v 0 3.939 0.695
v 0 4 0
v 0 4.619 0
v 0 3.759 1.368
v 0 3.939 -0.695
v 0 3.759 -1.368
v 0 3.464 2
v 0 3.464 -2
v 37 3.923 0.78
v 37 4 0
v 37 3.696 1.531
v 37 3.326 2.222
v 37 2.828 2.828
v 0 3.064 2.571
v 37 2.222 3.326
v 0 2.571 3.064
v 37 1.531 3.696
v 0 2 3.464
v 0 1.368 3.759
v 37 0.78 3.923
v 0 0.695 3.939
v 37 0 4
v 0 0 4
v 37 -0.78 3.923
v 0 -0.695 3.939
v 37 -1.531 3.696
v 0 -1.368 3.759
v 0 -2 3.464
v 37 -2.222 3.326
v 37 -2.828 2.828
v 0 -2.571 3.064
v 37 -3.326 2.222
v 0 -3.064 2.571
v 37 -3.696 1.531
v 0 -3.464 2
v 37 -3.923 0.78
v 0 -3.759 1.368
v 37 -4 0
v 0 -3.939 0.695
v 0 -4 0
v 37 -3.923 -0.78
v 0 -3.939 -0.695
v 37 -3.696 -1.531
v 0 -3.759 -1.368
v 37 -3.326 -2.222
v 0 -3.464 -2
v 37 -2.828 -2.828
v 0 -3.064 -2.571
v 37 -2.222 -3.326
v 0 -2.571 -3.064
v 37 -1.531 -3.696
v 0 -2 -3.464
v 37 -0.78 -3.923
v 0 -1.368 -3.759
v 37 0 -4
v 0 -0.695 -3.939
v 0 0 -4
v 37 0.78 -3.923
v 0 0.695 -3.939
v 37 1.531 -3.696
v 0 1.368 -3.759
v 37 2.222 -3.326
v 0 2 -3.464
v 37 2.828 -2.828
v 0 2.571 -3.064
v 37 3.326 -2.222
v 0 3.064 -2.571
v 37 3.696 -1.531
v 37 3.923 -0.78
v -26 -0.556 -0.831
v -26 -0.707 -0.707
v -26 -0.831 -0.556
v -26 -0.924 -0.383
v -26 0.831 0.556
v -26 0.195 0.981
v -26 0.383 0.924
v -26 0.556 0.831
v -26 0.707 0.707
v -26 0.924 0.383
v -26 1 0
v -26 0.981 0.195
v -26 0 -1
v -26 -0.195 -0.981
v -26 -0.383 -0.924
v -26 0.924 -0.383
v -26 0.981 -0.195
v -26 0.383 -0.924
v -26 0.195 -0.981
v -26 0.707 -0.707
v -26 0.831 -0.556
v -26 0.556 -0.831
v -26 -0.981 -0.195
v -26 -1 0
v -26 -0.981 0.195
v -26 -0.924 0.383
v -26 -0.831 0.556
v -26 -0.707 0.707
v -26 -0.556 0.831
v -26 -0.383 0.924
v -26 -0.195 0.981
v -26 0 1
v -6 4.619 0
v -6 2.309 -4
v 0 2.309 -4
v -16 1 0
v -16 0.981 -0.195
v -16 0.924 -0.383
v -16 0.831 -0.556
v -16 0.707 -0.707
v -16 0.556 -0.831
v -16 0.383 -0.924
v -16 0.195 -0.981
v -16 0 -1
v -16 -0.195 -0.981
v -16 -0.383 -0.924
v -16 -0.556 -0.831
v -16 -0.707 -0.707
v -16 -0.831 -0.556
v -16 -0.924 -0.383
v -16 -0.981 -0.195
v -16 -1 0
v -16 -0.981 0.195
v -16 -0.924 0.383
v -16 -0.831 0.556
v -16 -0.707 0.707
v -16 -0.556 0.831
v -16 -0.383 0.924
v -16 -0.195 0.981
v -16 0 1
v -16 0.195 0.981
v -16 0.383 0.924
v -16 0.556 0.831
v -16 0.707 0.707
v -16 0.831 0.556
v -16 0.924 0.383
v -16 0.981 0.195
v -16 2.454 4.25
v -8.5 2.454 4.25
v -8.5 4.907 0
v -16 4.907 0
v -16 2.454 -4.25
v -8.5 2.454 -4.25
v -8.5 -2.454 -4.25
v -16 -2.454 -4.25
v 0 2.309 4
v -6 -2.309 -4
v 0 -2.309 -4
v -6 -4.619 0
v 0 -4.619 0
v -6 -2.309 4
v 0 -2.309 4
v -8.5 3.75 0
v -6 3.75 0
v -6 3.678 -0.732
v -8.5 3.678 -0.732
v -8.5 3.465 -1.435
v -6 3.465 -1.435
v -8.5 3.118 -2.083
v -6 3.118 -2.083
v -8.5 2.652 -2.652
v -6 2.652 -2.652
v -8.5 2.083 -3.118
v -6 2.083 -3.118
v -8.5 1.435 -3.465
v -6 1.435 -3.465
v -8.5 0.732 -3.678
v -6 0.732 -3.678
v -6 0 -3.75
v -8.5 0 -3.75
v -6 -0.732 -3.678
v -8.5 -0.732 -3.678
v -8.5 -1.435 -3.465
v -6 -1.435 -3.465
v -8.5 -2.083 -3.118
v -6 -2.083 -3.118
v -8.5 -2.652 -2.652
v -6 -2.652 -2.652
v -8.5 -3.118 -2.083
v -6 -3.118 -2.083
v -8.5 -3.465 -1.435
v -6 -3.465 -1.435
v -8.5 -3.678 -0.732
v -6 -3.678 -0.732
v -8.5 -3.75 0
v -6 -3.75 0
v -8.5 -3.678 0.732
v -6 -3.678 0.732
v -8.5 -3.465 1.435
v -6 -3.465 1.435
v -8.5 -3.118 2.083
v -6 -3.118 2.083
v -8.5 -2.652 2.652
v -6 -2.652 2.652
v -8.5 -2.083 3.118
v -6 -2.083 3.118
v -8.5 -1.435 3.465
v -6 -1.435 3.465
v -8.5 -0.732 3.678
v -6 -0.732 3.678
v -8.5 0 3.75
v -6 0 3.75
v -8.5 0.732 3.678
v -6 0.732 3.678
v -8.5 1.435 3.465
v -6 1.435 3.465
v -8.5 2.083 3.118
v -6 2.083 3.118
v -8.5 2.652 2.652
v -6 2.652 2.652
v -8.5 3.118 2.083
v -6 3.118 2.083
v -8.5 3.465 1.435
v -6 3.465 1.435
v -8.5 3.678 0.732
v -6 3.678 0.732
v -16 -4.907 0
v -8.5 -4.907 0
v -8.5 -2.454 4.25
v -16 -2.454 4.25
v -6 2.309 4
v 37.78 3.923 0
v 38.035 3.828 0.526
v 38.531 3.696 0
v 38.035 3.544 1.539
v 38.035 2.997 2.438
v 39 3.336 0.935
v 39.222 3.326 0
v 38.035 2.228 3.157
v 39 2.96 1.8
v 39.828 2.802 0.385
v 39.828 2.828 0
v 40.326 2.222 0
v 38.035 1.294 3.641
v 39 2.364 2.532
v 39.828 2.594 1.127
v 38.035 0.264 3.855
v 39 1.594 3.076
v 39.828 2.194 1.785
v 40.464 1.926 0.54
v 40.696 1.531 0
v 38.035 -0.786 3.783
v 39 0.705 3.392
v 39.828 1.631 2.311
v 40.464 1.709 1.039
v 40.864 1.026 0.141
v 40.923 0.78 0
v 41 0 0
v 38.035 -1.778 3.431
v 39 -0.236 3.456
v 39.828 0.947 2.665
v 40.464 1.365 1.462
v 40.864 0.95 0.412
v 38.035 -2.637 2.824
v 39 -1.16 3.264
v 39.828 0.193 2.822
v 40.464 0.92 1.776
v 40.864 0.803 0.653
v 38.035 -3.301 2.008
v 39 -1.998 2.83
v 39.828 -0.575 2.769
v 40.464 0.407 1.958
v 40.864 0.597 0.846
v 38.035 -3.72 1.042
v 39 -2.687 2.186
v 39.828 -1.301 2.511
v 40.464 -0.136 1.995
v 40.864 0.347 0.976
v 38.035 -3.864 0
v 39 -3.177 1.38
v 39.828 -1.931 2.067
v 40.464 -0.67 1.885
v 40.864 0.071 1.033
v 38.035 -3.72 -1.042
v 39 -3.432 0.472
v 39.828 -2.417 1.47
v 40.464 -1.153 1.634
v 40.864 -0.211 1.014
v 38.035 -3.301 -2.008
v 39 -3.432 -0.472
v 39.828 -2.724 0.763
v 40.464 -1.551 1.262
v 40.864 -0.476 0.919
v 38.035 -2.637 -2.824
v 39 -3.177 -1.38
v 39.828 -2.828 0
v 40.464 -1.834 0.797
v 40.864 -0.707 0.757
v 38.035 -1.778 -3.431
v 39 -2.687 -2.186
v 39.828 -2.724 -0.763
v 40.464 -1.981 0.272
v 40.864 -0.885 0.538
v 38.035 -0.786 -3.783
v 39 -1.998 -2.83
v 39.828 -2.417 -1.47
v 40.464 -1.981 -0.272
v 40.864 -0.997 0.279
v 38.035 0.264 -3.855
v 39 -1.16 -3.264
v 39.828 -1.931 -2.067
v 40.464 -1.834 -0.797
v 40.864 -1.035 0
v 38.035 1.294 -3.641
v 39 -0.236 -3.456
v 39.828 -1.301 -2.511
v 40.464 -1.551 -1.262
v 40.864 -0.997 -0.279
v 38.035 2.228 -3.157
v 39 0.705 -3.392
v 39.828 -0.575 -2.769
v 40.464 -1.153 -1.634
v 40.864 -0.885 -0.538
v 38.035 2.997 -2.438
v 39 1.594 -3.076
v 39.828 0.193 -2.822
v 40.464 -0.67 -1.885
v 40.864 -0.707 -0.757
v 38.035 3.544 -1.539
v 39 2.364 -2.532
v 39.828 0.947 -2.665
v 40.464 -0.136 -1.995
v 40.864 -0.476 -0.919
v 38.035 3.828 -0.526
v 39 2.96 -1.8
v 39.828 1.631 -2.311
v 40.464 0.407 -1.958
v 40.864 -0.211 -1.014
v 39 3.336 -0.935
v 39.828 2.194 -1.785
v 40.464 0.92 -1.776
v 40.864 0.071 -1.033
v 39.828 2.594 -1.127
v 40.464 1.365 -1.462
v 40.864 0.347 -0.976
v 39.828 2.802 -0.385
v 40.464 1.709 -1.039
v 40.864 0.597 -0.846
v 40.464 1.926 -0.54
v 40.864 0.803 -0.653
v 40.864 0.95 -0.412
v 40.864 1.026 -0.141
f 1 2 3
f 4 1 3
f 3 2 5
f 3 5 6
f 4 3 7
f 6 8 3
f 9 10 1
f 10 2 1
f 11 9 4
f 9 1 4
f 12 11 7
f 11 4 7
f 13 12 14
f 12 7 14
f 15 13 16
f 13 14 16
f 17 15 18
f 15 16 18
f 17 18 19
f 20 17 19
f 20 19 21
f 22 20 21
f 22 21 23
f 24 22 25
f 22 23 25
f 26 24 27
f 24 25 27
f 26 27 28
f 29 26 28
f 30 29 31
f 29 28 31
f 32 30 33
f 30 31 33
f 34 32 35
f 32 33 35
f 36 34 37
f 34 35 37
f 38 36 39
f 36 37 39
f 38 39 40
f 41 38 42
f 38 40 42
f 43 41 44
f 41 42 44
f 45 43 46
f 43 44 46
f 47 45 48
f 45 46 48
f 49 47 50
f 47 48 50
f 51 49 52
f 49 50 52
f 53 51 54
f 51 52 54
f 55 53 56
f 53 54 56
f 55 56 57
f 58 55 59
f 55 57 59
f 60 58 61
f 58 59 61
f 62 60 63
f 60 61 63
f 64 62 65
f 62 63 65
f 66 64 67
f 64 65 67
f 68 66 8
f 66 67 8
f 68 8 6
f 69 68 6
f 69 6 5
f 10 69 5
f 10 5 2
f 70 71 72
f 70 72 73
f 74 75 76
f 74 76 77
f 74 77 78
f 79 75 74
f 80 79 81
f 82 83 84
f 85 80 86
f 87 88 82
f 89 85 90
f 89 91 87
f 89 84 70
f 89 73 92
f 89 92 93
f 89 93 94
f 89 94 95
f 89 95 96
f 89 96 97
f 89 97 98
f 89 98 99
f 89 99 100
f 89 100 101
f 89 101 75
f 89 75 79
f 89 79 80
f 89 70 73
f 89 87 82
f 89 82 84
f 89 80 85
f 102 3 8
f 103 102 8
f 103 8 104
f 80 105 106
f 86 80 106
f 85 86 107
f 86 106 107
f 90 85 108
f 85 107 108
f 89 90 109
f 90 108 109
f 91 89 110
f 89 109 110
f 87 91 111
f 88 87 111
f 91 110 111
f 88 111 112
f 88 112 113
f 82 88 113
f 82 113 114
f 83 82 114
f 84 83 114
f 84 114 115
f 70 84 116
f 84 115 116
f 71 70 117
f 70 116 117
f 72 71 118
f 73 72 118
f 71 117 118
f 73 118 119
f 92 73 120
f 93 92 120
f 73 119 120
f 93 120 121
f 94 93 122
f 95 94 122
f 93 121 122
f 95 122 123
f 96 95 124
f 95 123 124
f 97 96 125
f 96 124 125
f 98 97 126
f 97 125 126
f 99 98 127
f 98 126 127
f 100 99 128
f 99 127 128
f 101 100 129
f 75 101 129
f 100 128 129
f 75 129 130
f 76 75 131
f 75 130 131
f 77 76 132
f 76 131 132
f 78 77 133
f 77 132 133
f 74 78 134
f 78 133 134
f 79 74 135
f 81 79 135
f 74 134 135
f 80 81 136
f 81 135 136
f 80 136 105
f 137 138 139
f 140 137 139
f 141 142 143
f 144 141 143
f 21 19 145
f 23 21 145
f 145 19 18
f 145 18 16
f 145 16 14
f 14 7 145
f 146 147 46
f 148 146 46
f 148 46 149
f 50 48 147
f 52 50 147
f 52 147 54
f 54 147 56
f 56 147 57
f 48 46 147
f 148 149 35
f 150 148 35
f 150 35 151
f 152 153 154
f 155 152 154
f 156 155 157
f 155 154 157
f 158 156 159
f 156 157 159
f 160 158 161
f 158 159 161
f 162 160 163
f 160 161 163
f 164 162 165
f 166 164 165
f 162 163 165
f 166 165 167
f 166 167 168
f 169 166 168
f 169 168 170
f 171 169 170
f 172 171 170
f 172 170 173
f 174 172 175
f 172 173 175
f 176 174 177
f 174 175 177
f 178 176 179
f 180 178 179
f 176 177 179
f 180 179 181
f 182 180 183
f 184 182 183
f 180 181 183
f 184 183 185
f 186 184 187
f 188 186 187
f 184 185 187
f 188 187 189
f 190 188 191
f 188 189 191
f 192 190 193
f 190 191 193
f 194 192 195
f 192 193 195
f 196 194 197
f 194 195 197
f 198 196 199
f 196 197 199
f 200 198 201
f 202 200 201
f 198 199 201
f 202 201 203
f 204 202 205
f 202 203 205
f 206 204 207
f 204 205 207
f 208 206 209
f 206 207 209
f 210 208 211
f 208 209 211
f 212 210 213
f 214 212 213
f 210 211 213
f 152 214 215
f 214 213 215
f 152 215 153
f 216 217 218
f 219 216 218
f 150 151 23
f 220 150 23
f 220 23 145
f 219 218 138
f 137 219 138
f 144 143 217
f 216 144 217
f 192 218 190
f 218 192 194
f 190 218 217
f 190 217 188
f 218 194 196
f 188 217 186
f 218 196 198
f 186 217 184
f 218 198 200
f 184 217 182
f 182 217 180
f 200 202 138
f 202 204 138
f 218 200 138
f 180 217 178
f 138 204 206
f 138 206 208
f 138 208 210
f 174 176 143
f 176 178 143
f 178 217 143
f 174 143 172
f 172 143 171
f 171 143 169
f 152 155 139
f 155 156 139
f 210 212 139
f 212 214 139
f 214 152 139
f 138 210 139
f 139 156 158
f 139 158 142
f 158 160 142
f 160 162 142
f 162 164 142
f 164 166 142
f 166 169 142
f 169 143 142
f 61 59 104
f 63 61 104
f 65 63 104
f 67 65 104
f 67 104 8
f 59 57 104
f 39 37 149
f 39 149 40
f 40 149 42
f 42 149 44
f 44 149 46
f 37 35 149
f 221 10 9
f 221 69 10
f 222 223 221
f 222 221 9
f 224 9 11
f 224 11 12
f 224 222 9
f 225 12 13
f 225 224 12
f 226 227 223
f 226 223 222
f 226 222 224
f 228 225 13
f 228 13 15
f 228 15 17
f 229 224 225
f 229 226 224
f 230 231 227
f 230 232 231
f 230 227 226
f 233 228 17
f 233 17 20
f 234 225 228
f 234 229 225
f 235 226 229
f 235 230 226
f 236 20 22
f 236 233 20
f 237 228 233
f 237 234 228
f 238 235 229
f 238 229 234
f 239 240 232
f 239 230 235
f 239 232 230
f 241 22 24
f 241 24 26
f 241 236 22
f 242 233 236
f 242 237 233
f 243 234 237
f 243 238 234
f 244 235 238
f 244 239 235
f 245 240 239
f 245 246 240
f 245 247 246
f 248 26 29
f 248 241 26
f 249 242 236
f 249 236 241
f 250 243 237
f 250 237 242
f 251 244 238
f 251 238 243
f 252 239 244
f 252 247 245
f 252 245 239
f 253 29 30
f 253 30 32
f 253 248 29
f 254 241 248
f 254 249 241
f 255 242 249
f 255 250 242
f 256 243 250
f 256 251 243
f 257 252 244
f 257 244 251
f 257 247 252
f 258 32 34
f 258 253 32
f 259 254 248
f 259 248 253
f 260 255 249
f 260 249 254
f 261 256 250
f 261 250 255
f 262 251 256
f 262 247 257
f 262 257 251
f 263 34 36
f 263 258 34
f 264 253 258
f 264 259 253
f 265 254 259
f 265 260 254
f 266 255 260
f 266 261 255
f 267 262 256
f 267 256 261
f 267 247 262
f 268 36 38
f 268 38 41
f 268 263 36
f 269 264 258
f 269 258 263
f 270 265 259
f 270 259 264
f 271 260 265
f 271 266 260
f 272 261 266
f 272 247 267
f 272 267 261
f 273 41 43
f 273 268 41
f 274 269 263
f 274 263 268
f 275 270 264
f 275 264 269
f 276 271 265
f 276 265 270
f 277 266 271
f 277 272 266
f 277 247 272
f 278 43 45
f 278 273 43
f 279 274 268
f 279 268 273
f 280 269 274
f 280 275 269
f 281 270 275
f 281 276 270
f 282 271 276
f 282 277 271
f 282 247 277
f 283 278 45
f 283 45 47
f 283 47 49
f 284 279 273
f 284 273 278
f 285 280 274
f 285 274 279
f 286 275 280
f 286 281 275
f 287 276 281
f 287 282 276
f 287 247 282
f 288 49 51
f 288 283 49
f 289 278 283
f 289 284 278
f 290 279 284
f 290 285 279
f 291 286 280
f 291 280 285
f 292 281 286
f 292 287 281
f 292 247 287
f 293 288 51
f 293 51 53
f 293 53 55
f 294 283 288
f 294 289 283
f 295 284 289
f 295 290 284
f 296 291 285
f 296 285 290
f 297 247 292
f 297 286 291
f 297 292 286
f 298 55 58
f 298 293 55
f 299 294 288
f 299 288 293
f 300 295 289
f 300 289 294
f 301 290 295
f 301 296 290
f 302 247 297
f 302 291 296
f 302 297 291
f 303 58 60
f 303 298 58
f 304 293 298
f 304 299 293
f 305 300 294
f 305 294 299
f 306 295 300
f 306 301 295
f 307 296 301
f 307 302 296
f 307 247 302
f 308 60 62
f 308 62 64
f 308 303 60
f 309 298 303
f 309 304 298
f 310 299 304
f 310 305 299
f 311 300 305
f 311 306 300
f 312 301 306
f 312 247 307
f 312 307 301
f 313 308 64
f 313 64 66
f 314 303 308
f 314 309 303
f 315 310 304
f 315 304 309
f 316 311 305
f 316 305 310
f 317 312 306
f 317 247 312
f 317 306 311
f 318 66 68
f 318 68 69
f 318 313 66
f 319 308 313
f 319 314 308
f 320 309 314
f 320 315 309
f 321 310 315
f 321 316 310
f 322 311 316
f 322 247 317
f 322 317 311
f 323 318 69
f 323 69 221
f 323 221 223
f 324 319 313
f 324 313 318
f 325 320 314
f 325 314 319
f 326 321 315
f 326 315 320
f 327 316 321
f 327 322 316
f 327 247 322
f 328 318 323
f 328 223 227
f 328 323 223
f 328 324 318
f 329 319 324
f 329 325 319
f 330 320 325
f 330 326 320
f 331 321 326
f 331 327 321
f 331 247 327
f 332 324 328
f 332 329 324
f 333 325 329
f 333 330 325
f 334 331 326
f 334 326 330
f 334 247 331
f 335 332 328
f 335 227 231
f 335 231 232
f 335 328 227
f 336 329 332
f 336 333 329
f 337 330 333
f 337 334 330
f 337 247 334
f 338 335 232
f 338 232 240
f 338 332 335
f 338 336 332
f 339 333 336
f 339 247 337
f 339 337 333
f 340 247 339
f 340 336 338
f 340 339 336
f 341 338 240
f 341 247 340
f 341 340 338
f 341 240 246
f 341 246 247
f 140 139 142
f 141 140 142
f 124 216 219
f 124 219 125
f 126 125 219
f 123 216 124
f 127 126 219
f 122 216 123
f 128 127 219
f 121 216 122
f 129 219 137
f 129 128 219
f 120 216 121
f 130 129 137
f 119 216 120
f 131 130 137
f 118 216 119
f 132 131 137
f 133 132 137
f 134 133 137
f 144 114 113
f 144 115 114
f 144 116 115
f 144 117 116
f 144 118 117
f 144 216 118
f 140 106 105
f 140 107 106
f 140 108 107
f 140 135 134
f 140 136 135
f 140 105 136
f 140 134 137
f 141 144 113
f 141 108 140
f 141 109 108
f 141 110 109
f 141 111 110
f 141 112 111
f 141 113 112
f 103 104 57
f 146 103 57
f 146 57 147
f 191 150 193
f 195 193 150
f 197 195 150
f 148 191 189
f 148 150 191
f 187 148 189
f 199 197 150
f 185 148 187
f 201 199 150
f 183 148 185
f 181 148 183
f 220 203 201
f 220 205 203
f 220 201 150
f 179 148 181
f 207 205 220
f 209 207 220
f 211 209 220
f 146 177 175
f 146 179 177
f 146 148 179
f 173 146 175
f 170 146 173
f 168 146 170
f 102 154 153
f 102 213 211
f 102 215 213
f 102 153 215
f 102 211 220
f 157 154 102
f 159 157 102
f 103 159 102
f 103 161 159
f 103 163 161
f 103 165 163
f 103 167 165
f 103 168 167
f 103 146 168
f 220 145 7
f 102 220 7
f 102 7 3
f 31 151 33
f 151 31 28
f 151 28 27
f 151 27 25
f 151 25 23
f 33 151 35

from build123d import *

# Parameters (mm, degrees)
SKETCH_R     = 4
PAD_DEPTH    = 41
FILLET_R     = 4
PAD001_DEPTH = 6
SKETCH002_R  = 3.75
PAD002_DEPTH = 2.5
PAD003_DEPTH = 7.5
SKETCH004_R  = 1
PAD004_DEPTH = 10


with BuildPart() as part:
    # Sketch → Pad (new body)
    with BuildSketch(Plane.YZ):
        Circle(SKETCH_R)
    extrude(amount=PAD_DEPTH)

    # Fillet
    fillet_edges = [part.edges().sort_by_distance(p)[0] for p in [
        (41, -4, 0),
    ]]
    fillet(fillet_edges, radius=FILLET_R)

    # Sketch001 (on Face3 of Fillet) → Pad001 (join)
    with BuildSketch(Plane(origin=(0, 0, 0), x_dir=(0, 1, 0), z_dir=(-1, 0, 0))):
        Polygon((4.618802, 0), (2.309401, 4), (-2.309401, 4), (-4.618802, 0), (-2.309401, -4), (2.309401, -4), align=None)
    extrude(amount=PAD001_DEPTH)

    # Sketch002 (on Face15 of Pad001) → Pad002 (join)
    with BuildSketch(Plane(origin=(-6, 0, 0), x_dir=(0, 1, 0), z_dir=(-1, 0, 0))):
        Circle(SKETCH002_R)
    extrude(amount=PAD002_DEPTH)

    # Sketch003 (on Face17 of Pad002) → Pad003 (join)
    with BuildSketch(Plane(origin=(-8.5, 0, 0), x_dir=(0, 1, 0), z_dir=(-1, 0, 0))):
        Polygon((4.907477, 0), (2.453739, 4.25), (-2.453739, 4.25), (-4.907477, 0), (-2.453739, -4.25), (2.453739, -4.25), align=None)
    extrude(amount=PAD003_DEPTH)

    # Sketch004 (on Face24 of Pad003) → Pad004 (join)
    with BuildSketch(Plane(origin=(-16, 0, 0), x_dir=(0, 1, 0), z_dir=(-1, 0, 0))):
        Circle(SKETCH004_R)
    extrude(amount=PAD004_DEPTH)


solid = part.part
